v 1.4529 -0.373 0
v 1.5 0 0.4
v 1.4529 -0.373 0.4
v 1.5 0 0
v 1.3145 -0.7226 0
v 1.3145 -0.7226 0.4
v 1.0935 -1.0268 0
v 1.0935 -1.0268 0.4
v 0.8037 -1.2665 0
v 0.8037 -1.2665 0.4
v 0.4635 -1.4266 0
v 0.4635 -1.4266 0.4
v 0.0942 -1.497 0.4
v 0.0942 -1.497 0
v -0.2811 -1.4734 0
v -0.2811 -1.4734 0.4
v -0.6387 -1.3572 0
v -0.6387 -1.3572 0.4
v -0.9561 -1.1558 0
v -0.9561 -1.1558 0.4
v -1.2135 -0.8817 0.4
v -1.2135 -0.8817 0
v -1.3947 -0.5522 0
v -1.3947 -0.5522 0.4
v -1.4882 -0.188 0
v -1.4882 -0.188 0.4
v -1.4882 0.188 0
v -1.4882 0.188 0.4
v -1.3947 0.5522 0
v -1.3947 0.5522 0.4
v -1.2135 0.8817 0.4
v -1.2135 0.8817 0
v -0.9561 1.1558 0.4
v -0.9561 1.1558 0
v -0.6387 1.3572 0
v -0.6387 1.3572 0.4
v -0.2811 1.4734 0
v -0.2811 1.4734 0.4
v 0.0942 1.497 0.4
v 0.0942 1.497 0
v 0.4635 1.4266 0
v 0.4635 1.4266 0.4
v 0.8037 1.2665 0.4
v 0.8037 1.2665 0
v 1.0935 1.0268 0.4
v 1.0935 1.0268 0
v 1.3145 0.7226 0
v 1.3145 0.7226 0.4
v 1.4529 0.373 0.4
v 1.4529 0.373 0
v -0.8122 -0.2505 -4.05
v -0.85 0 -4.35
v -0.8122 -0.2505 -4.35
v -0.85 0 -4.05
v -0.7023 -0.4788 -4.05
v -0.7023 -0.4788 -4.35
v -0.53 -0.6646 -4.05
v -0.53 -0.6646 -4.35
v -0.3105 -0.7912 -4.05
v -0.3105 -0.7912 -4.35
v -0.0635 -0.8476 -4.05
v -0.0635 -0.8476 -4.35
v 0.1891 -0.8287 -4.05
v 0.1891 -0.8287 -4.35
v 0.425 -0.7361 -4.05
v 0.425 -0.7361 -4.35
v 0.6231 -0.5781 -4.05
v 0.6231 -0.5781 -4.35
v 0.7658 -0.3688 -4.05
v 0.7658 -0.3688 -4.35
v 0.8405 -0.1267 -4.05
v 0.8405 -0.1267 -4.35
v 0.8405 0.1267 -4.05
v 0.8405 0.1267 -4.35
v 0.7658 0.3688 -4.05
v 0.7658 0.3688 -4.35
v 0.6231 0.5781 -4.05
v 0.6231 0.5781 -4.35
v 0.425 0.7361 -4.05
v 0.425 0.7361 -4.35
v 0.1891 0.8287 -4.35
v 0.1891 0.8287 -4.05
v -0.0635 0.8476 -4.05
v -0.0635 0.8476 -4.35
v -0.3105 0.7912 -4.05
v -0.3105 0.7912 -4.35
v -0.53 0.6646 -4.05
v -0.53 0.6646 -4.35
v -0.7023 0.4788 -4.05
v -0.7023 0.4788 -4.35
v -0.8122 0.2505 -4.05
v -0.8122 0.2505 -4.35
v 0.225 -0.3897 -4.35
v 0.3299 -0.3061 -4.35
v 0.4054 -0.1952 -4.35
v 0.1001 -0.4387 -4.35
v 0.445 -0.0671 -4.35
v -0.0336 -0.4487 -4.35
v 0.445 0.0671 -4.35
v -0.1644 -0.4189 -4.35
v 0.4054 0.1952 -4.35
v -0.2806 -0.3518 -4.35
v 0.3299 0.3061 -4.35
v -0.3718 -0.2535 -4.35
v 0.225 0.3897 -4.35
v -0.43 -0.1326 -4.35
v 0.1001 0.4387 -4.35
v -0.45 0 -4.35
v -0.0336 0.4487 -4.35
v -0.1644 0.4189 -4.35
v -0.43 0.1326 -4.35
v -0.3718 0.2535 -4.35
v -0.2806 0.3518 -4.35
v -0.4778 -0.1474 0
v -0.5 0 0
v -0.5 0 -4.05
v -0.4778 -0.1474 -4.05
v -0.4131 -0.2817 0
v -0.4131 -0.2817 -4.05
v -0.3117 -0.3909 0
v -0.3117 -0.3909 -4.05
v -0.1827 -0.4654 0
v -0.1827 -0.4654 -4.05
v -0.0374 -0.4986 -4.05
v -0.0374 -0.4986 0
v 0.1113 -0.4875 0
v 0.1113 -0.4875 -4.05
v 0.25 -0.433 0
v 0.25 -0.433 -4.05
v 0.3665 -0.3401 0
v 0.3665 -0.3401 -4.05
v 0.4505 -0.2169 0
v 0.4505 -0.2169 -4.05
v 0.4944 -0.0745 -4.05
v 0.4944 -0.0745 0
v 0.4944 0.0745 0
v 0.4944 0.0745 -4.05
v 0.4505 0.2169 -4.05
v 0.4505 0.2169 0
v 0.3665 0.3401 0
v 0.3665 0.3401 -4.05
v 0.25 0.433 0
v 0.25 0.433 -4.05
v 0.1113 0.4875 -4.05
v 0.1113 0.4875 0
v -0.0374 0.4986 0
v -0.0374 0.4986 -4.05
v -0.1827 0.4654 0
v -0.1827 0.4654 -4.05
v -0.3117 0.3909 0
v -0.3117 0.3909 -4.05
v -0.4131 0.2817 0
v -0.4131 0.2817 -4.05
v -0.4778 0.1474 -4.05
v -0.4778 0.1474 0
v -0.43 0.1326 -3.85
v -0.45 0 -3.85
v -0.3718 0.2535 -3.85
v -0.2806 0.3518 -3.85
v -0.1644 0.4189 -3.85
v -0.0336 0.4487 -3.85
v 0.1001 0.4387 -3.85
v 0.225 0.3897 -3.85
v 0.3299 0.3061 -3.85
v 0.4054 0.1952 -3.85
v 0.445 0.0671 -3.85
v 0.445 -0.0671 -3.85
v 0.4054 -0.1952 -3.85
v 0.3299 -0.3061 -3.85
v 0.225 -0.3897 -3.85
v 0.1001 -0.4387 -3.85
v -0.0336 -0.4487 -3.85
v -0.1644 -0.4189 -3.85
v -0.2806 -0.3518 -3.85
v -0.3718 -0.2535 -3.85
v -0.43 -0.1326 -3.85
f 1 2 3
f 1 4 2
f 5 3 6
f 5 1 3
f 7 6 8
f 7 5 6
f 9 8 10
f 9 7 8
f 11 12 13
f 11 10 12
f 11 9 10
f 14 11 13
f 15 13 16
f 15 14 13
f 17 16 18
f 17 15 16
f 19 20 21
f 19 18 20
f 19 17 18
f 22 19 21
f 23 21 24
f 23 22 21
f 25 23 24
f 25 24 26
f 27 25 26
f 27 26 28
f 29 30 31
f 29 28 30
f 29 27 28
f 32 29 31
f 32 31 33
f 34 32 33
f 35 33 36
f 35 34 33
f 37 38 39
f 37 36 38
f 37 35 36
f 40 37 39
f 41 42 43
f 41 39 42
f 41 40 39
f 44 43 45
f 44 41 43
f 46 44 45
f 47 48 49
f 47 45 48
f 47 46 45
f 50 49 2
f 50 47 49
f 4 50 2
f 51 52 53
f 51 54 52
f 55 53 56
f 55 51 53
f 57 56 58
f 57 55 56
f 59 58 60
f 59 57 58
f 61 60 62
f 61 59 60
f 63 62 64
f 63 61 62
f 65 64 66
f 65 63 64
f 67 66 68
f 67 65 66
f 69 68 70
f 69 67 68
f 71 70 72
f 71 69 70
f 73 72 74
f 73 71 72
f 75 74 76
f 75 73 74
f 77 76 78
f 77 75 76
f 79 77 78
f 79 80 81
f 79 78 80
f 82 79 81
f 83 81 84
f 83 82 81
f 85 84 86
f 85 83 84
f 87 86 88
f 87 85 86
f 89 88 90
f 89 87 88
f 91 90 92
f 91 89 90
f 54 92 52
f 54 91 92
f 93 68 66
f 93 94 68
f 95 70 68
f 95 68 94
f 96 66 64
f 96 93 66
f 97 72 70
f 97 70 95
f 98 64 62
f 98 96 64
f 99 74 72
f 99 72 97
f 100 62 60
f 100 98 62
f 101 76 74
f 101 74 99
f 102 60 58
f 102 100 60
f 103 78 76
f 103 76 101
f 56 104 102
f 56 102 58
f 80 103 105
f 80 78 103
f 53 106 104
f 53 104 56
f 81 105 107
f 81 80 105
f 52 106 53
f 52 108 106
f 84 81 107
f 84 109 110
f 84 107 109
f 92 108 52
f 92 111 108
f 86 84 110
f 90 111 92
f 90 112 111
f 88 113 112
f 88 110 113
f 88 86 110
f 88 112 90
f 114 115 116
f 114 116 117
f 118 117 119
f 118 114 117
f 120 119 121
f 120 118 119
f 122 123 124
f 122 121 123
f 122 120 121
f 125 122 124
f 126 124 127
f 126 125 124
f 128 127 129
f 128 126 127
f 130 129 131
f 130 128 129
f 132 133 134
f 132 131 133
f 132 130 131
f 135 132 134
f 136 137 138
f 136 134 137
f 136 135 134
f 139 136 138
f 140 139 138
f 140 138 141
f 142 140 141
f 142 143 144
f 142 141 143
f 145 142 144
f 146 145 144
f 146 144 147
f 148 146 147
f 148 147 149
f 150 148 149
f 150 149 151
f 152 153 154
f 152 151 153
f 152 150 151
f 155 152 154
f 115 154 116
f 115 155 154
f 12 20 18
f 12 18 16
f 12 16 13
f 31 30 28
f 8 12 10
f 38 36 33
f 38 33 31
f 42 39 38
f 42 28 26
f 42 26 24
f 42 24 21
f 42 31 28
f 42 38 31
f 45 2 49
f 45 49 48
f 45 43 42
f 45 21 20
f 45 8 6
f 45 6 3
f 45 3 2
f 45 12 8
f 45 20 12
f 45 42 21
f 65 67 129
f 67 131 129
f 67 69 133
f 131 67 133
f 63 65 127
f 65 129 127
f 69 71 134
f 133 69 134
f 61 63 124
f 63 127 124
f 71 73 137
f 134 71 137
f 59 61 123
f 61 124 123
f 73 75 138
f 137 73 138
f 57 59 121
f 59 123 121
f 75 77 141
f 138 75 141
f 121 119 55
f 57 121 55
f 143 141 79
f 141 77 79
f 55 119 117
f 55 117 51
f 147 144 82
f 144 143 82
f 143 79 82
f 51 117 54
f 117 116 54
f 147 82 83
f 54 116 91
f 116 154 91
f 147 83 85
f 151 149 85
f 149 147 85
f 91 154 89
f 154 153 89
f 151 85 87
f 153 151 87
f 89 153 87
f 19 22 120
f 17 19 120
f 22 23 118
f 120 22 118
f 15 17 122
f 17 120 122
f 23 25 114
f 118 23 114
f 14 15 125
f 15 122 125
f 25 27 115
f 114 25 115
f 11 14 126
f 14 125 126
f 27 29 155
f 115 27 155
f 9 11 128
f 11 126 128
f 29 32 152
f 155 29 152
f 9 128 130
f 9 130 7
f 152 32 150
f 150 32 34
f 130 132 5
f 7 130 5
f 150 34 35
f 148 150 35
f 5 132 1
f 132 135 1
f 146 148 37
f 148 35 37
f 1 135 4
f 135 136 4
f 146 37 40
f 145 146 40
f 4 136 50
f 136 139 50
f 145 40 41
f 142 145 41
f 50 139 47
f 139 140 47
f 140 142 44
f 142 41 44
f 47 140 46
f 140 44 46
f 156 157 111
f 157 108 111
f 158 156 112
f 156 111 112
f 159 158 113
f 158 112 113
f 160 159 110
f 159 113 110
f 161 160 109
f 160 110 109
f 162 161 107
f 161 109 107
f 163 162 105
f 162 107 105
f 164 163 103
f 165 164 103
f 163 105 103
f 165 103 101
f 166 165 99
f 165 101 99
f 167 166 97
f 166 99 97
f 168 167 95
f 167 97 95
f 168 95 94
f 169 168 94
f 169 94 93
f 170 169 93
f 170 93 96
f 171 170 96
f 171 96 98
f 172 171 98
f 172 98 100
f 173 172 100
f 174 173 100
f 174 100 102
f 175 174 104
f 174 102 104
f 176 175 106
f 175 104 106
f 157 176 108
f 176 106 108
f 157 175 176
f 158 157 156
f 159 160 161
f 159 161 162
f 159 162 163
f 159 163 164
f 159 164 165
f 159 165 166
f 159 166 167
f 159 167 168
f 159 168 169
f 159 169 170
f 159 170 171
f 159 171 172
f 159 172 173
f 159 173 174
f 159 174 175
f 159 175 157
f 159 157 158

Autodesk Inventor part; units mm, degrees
ref_plane "YZ Plane" through (0, 0, 0) normal (1, 0, 0) x (0, 1, 0)
ref_plane "XZ Plane" through (0, 0, 0) normal (0, 1, 0) x (-1, 0, 0)
ref_plane "XY Plane" through (0, 0, 0) normal (0, 0, 1) x (1, 0, 0)
sketch "Sketch1" plane through (0, 0, 0) normal (0, 0, 1) x (1, 0, 0)
  circle A0 centre (0, 0) radius 1.5
  dimension "d0" = 3
extrude "Extrusion1" add sketch "Sketch1" along normal blind 0.4
sketch "Sketch2" plane through (0, 0, 0) normal (0, 0, -1) x (-1, 0, 0)
  circle A0 centre (0, 0) radius 1.5 projected
  circle A1 centre (0, 0) radius 0.5
  dimension "d3" = 1
extrude "Extrusion2" add sketch "Sketch2" along normal blind 4.05 contours A1
sketch "Sketch3" plane through (0, 0, -4.05) normal (0, 0, -1) x (-1, 0, 0)
  circle A0 centre (0, 0) radius 0.5 projected
  circle A1 centre (0, 0) radius 0.85
  dimension "d7" = 1.7
extrude "Extrusion3" add sketch "Sketch3" along normal blind 0.3 contours A0 | A1
sketch "Sketch4" plane through (0, 0, -4.35) normal (0, 0, -1) x (-1, 0, 0)
  circle A0 centre (0, 0) radius 0.85 projected
  circle A1 centre (0, 0) radius 0.45
  dimension "d10" = 0.9
extrude "Extrusion4" cut sketch "Sketch4" against normal blind 0.5 contours A1
properties material "Brass"
